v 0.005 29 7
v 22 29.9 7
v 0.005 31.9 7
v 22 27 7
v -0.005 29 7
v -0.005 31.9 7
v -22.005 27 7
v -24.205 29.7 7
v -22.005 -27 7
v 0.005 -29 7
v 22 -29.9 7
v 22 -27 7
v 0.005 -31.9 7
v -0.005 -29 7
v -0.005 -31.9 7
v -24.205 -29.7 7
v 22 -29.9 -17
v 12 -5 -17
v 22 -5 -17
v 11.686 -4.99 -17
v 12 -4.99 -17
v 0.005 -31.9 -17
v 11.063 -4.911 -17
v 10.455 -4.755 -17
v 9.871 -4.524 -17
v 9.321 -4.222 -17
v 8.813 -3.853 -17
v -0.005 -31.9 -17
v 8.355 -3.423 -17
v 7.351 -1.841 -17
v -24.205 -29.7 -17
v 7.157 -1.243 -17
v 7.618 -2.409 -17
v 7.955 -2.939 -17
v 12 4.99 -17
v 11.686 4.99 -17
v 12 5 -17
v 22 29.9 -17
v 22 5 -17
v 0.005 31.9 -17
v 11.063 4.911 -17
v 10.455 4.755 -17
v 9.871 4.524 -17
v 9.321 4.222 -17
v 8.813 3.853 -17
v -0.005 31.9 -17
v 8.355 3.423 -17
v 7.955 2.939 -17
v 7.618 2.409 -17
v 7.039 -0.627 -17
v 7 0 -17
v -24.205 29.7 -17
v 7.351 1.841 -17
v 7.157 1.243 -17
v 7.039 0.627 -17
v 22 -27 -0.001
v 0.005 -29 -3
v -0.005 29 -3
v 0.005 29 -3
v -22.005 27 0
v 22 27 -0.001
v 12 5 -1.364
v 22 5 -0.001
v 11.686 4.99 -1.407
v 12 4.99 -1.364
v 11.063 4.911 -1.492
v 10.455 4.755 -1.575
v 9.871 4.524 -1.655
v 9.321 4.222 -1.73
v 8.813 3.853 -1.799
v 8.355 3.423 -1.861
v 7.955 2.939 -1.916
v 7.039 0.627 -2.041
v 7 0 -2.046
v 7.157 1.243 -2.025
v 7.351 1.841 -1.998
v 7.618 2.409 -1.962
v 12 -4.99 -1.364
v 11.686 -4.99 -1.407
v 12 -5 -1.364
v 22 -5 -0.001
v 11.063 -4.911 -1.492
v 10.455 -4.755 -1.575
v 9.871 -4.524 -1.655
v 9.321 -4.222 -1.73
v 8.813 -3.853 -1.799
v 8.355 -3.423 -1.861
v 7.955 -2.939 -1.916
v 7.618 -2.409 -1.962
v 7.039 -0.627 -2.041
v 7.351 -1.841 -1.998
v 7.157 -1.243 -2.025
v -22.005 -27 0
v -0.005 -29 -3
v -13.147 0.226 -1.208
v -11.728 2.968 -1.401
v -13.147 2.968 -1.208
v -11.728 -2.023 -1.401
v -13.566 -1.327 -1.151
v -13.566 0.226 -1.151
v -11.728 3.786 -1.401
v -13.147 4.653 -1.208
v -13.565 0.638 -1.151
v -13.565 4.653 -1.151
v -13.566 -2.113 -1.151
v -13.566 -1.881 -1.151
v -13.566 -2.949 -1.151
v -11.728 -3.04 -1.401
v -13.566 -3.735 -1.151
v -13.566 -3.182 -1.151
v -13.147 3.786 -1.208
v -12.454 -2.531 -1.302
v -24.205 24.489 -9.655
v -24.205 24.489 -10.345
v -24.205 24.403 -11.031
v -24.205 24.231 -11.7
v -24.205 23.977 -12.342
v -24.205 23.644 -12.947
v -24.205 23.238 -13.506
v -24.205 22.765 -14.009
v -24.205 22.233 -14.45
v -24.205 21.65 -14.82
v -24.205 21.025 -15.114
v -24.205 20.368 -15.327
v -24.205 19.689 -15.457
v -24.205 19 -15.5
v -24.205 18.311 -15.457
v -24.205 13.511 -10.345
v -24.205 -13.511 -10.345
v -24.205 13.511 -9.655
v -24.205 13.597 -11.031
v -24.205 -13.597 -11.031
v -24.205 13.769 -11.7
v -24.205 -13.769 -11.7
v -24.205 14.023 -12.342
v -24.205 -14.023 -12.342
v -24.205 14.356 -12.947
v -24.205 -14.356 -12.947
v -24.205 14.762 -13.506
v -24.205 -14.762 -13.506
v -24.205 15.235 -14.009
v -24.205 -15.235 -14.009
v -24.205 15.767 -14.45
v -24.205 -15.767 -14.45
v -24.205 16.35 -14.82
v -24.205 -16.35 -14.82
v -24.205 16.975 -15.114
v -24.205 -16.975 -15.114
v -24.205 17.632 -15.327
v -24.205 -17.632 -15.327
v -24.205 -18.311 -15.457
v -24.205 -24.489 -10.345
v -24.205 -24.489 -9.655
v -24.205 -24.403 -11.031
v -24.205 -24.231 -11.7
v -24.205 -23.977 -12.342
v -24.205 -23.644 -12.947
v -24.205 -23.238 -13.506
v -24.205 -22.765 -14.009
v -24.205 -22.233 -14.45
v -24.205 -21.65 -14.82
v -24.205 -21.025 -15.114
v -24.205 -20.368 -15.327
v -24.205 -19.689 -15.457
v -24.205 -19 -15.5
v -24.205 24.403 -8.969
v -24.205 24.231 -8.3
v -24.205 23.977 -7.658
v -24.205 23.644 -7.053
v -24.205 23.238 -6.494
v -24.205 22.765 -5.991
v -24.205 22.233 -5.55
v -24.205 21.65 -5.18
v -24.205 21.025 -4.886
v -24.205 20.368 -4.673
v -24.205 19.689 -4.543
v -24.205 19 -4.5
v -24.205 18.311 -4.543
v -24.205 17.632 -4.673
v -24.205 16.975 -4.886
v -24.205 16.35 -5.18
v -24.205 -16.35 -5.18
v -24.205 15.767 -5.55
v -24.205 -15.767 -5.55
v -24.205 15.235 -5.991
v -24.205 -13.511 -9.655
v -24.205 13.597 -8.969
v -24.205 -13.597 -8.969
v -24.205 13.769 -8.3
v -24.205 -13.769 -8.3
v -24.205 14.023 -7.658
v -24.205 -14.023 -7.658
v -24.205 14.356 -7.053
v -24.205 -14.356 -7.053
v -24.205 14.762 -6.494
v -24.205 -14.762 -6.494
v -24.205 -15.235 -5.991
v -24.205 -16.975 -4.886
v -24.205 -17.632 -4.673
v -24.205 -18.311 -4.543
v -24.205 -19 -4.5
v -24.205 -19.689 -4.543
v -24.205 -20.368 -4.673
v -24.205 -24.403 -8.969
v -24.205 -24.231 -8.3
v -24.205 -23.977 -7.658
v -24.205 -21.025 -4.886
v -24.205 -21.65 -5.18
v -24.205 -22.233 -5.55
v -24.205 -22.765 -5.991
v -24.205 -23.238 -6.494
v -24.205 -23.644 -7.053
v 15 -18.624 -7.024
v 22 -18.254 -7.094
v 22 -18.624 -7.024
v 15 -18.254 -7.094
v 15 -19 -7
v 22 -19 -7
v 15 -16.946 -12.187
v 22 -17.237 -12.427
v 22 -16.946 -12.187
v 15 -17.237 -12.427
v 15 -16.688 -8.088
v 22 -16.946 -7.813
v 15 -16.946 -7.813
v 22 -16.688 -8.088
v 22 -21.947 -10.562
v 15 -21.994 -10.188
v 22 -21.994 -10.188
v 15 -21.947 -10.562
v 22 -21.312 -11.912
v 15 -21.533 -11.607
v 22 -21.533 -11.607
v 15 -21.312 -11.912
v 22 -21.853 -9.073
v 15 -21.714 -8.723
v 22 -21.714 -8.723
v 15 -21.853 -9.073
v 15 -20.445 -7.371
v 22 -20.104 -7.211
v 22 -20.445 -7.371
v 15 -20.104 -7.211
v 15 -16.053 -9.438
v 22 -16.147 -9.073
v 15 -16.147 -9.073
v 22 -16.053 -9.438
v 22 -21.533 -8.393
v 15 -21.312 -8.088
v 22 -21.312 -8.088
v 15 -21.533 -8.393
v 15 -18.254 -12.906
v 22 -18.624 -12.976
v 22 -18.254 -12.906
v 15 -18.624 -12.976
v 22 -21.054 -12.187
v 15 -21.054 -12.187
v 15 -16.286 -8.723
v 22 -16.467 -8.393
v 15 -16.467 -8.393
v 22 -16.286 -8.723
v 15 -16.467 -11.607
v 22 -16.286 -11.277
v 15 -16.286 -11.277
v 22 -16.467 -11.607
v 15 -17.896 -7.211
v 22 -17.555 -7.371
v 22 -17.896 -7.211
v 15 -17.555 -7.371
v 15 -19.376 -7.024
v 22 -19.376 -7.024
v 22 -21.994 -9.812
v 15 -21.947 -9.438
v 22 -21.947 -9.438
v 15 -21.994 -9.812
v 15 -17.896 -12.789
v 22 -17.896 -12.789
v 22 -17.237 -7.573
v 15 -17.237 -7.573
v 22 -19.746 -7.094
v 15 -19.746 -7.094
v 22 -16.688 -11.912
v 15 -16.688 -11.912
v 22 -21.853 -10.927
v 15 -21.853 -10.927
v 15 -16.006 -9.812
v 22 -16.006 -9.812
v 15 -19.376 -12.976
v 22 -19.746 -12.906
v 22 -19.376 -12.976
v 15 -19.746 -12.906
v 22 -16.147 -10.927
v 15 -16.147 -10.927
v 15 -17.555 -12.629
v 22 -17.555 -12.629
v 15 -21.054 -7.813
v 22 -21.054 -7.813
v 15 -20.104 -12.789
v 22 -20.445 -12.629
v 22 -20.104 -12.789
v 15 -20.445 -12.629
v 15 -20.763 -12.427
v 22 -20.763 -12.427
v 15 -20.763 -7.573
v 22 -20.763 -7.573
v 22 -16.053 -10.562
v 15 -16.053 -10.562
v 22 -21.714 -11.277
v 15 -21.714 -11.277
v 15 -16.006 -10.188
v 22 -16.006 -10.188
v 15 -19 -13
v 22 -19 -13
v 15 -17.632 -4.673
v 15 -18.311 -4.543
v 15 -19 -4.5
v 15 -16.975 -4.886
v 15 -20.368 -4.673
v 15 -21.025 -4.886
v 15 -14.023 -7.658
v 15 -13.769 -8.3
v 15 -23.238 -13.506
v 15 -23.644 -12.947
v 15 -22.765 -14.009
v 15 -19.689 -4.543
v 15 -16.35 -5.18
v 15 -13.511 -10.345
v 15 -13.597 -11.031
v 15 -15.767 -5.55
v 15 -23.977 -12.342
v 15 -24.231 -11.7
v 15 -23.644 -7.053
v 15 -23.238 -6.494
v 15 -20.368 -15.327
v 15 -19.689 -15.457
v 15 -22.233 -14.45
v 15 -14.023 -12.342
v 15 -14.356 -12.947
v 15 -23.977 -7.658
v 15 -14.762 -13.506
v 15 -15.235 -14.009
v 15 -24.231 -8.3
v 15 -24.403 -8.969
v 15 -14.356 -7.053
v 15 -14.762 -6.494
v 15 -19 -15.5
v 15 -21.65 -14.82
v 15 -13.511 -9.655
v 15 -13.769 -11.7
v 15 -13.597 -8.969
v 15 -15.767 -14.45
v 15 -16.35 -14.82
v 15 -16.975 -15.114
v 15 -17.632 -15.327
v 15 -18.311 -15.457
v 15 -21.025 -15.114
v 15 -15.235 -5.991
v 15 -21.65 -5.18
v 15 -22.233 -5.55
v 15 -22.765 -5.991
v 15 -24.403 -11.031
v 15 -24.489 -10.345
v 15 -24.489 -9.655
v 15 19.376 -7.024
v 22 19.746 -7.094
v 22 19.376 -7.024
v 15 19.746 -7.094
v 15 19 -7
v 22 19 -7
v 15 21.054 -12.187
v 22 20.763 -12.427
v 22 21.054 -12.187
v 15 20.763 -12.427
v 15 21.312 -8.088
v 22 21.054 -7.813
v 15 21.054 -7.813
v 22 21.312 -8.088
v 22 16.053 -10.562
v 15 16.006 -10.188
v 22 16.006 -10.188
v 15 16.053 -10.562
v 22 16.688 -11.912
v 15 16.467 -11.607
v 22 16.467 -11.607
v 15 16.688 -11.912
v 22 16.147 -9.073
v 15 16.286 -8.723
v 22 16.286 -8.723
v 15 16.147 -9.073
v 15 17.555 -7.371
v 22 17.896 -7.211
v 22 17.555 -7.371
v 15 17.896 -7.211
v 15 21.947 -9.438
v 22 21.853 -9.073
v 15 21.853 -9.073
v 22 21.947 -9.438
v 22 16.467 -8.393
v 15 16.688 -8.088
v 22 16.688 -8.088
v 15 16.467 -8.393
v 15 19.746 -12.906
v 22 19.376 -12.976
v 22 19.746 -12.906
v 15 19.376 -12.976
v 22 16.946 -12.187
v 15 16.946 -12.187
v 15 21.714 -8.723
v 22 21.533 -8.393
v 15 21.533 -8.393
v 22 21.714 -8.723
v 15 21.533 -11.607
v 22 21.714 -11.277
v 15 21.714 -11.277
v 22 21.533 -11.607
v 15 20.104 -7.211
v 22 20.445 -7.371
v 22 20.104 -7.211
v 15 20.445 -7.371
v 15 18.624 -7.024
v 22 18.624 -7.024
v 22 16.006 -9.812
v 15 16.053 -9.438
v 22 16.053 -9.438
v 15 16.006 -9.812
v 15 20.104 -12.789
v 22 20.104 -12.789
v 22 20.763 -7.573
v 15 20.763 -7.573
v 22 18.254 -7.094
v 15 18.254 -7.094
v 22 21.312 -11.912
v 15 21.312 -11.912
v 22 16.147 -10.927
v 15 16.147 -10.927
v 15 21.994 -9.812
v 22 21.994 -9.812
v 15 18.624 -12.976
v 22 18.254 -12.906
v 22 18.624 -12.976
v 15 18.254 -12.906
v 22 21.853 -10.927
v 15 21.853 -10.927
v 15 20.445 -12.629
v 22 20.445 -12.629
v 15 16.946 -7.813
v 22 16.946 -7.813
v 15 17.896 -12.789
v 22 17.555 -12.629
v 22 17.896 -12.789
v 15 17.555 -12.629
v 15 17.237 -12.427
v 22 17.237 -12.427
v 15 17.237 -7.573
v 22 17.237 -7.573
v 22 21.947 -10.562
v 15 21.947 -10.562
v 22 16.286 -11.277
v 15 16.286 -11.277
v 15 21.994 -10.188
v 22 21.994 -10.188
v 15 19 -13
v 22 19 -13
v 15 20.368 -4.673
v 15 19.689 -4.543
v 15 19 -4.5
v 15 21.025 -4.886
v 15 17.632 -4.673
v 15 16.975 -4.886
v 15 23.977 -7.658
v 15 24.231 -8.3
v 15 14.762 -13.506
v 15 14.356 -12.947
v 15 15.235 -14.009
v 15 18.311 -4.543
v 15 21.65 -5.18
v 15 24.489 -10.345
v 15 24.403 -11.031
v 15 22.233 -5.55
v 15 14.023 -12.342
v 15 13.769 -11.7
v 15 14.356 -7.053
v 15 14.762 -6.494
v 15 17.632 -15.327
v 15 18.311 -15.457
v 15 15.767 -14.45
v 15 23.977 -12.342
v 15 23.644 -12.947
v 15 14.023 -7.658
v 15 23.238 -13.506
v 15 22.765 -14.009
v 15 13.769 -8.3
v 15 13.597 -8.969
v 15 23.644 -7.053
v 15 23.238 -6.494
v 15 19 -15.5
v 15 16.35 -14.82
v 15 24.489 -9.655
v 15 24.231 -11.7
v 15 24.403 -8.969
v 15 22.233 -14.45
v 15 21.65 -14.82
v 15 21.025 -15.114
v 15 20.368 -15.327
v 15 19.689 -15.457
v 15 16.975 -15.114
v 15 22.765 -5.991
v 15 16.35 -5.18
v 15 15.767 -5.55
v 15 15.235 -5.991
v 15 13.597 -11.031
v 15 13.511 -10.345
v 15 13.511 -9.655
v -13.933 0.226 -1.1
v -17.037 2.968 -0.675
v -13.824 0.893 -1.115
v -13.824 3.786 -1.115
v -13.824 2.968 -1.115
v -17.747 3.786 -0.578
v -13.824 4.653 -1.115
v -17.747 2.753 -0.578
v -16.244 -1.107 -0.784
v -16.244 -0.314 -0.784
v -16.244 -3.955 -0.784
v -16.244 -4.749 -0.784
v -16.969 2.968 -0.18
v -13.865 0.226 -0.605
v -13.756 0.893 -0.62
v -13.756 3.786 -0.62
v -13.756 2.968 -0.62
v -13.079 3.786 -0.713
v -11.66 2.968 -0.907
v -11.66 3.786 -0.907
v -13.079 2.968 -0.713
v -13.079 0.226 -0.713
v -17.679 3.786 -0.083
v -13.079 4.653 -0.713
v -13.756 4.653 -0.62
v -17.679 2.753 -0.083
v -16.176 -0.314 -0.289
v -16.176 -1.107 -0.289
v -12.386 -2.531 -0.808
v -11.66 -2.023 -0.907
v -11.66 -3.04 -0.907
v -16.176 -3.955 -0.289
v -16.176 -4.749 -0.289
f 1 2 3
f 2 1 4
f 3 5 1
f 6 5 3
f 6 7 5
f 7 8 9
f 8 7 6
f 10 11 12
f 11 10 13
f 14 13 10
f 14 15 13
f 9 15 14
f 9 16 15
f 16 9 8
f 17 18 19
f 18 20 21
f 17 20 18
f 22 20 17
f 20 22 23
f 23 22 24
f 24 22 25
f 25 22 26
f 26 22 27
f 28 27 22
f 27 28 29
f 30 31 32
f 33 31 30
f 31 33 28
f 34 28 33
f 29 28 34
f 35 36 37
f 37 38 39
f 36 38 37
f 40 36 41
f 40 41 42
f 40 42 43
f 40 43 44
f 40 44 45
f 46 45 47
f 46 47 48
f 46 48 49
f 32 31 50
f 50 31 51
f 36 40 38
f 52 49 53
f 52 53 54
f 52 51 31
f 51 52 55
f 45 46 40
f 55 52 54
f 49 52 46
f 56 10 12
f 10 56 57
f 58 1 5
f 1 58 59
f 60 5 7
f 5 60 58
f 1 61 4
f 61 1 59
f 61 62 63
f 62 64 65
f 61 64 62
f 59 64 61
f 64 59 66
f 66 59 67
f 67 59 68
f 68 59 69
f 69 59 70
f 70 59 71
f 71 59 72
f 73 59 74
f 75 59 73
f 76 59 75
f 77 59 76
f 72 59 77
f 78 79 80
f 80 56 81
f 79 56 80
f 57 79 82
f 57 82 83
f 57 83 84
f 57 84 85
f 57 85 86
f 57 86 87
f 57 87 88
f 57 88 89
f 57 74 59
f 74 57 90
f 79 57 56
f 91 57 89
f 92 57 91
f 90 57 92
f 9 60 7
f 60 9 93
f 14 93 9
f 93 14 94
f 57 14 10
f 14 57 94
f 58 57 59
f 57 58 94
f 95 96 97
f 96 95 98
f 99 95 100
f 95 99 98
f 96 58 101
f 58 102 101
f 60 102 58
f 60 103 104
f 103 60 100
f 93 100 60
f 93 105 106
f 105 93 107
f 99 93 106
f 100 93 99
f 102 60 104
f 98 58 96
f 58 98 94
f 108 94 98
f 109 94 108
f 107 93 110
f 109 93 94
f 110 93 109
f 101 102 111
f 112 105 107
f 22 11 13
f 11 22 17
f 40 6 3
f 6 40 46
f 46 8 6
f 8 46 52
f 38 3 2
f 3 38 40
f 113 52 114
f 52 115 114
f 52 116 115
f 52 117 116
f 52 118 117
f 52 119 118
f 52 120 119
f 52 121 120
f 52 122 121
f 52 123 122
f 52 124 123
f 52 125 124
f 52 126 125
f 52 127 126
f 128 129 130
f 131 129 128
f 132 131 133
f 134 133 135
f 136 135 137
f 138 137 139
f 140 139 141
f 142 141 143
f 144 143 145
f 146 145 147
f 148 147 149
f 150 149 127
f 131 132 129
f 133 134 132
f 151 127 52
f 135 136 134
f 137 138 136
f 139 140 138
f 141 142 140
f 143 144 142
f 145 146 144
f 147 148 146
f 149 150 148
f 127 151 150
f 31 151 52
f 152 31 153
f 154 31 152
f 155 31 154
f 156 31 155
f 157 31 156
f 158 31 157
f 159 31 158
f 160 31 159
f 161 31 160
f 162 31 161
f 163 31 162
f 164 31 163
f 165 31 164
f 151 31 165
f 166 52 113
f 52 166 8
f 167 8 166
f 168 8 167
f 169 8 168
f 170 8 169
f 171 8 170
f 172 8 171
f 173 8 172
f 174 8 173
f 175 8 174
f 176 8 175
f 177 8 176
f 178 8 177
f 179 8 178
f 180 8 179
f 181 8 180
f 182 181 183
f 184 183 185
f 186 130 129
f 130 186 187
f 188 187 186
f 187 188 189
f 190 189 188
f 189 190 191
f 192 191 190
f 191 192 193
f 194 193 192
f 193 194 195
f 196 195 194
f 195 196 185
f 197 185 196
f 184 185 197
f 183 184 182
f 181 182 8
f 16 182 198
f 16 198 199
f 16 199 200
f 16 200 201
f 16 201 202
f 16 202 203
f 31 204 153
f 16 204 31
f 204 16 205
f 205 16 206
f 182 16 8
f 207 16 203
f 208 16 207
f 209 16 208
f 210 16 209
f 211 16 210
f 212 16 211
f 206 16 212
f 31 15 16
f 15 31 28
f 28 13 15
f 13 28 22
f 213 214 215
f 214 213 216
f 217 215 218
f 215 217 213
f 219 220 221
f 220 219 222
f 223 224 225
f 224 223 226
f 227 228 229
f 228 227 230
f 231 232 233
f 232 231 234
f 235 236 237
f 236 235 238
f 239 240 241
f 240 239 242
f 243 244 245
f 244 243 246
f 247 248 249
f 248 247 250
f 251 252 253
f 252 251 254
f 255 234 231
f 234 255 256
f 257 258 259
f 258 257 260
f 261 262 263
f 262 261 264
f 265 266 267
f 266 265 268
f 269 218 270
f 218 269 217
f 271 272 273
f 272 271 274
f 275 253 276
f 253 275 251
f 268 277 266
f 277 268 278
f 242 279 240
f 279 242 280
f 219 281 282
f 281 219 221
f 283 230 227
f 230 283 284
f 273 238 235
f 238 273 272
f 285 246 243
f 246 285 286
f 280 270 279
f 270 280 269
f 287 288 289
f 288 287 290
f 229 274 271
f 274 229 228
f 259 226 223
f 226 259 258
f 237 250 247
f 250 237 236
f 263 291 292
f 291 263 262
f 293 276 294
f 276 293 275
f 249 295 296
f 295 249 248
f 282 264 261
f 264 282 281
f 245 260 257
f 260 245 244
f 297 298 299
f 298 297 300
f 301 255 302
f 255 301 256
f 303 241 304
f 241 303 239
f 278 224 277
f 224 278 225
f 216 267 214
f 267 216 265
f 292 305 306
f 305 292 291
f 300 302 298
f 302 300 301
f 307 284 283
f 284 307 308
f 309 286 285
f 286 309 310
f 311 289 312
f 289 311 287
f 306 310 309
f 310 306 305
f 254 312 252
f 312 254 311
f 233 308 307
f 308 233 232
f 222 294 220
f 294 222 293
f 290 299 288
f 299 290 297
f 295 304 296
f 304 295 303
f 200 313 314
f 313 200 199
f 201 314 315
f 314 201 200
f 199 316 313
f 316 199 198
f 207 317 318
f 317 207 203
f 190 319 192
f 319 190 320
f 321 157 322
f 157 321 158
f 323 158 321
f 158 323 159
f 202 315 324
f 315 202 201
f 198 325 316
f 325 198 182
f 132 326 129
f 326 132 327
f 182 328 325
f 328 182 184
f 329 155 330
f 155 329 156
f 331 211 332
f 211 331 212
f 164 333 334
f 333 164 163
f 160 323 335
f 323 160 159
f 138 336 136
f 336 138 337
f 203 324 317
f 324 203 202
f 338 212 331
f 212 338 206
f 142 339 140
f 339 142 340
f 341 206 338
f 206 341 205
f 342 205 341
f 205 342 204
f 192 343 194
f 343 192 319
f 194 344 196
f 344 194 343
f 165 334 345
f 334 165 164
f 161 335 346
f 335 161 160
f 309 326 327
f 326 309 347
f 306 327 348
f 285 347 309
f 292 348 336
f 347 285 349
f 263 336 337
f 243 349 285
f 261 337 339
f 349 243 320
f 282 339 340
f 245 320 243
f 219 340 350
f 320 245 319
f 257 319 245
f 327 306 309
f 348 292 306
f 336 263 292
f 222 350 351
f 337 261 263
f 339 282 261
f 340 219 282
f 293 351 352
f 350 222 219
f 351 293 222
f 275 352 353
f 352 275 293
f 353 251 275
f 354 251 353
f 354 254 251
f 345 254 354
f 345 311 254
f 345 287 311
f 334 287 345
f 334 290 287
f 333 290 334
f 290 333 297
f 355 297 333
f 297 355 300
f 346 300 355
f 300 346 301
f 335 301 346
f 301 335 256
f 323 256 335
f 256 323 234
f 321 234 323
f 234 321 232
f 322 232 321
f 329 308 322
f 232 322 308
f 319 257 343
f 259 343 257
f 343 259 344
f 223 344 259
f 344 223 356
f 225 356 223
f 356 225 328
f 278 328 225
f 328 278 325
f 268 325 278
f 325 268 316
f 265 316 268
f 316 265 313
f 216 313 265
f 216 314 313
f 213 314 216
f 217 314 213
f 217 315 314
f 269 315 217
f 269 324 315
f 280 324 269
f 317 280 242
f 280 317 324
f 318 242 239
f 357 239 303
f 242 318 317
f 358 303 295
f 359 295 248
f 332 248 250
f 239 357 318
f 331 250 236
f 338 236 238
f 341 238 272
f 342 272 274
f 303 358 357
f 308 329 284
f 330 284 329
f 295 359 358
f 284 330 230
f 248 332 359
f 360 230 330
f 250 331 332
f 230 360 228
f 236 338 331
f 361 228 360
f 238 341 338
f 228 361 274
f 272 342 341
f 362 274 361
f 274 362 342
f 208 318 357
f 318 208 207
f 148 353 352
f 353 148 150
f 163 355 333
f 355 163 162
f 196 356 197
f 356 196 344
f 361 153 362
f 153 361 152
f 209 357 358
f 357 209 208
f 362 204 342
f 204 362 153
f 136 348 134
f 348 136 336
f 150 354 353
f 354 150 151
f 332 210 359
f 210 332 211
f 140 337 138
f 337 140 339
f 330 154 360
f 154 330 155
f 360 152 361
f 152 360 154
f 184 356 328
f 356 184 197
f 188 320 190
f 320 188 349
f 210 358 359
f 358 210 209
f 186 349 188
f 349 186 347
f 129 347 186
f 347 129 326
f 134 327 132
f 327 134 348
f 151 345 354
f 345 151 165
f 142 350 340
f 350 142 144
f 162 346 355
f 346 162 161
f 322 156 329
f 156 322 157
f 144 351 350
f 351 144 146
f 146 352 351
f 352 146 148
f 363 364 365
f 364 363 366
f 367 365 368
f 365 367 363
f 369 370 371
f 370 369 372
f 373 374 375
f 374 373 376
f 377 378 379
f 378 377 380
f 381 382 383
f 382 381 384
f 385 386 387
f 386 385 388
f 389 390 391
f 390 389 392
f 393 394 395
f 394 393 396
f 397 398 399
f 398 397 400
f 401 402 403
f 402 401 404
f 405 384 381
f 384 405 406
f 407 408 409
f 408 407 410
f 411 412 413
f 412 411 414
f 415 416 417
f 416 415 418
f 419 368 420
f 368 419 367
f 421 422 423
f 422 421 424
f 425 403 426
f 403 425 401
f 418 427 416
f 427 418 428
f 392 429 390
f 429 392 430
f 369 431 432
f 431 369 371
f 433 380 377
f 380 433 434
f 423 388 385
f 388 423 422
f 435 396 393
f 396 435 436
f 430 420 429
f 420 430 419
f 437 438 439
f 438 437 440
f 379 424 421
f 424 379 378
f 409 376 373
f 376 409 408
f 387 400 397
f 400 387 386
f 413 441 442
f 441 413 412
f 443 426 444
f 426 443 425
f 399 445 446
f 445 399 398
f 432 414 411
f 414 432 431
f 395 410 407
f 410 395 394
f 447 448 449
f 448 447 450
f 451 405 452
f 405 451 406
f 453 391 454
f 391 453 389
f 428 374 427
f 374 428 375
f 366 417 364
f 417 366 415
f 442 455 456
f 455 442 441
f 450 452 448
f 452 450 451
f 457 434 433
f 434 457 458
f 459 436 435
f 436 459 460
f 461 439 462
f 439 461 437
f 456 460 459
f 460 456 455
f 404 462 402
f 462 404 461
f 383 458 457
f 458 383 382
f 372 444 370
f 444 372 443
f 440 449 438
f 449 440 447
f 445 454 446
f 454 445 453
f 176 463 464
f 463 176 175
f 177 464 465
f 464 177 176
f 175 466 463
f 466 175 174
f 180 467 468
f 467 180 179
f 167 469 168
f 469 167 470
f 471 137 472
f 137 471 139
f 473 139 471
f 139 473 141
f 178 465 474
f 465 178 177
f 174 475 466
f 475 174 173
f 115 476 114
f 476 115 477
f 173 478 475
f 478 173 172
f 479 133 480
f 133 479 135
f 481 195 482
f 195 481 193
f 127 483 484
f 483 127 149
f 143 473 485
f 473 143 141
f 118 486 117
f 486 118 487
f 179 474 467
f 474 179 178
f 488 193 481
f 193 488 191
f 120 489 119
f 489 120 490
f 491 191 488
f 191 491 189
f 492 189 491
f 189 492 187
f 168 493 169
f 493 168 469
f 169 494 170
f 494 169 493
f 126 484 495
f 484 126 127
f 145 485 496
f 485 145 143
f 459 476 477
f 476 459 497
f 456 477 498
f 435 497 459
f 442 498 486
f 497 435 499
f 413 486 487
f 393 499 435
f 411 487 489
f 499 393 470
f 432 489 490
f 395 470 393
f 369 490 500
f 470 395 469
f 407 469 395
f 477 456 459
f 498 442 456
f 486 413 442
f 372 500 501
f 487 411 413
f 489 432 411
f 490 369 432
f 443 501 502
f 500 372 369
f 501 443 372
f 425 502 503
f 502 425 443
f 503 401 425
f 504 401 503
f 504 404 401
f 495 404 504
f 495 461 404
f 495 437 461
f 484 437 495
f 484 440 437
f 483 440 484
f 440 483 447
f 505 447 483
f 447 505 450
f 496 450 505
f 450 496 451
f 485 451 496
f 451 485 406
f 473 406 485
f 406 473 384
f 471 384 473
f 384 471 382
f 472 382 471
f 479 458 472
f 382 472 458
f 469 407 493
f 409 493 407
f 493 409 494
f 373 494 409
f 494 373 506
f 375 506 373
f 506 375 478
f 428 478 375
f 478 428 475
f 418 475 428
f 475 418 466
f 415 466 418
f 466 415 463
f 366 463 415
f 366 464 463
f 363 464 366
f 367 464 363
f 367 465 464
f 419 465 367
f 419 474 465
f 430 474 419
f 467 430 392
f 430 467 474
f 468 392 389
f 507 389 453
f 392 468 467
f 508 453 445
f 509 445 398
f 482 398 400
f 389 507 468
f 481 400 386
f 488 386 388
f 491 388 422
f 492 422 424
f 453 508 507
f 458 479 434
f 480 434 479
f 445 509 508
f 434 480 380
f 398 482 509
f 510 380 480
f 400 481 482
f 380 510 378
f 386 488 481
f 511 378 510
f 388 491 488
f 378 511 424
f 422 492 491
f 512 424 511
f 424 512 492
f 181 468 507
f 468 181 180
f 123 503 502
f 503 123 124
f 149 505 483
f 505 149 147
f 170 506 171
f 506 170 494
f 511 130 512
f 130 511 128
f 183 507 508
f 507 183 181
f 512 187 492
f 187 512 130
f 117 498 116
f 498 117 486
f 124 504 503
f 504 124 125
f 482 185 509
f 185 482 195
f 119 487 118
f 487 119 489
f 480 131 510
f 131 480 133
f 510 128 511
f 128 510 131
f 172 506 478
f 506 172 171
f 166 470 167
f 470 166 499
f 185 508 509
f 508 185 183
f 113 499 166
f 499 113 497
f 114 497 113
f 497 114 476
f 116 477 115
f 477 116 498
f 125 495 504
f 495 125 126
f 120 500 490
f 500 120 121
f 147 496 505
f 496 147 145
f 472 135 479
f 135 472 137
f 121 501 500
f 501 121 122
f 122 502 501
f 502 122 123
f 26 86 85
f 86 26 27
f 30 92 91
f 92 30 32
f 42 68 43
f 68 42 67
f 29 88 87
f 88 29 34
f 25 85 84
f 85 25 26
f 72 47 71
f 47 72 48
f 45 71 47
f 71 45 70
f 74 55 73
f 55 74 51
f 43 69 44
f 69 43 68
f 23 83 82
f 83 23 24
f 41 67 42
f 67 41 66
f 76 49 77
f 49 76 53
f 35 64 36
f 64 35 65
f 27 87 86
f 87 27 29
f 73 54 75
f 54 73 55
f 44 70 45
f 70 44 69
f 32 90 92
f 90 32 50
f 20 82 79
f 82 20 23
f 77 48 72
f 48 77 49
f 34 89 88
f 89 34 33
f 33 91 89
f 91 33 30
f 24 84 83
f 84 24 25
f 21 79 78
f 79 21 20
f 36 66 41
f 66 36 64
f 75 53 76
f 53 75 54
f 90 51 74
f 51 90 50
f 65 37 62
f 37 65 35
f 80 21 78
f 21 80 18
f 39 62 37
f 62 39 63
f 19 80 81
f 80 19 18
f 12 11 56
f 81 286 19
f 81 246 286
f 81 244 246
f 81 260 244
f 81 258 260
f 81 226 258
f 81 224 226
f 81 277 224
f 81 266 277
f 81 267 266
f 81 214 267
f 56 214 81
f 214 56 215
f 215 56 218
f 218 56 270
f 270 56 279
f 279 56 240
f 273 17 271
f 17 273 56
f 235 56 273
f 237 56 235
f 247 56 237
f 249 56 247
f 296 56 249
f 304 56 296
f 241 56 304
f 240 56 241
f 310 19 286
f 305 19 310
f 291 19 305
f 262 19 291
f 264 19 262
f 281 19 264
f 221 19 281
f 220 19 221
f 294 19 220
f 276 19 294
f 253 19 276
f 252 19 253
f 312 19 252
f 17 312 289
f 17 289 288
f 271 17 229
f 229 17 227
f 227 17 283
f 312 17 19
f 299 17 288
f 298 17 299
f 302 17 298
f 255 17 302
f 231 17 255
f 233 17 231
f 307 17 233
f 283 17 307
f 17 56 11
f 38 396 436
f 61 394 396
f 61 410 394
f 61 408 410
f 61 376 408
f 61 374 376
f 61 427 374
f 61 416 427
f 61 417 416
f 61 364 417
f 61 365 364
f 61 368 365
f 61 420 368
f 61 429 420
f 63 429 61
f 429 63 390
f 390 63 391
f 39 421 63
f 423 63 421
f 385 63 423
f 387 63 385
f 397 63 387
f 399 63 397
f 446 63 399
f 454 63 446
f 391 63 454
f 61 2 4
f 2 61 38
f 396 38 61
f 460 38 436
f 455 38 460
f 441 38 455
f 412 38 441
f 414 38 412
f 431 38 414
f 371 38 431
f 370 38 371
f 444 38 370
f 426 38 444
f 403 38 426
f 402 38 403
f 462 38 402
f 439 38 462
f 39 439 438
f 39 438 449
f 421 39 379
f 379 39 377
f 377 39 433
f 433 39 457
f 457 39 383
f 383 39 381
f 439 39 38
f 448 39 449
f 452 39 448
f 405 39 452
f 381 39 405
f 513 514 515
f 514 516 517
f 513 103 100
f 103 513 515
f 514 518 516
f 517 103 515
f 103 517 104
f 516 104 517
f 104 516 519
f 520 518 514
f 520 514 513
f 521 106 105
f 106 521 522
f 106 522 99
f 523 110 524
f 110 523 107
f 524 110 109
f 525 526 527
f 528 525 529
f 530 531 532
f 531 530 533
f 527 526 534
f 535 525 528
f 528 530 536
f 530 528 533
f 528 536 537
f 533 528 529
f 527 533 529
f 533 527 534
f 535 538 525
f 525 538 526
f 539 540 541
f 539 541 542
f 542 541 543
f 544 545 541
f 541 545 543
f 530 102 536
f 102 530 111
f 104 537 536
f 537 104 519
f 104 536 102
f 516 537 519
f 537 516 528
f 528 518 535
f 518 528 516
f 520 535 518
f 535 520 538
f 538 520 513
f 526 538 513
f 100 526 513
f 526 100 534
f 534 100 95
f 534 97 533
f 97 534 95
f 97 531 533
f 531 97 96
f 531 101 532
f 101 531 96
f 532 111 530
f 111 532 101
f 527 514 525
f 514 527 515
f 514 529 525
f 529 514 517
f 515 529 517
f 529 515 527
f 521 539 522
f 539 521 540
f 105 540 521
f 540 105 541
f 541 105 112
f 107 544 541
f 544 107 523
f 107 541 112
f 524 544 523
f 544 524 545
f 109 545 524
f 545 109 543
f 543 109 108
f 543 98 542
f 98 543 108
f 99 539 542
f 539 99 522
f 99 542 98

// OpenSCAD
// file: doublefrustum.scad
//	  Last Modification : 01:57 Feb 20 2022 kivinen
//	  Last check in     : $Date: $
//	  Revision number   : $Revision: $
//	  State             : $State: $
//	  Version	    : 1.2
//	  Edit time	    : 5 min

// Make double frustum, i.e, three squares at z locations z0, z1, z2
// so that first square is +-x0, +-y0 etc.
module doublefrustum(z0, z1, z2, x0, y0, x1, y1, x2, y2) {
  POINTS=[[-x0, -y0, z0],
	  [x0, -y0, z0],
	  [x0, y0, z0],
	  [-x0, y0, z0],
	  [-x1, -y1, z1],
	  [x1, -y1, z1],
	  [x1, y1, z1],
	  [-x1, y1, z1],	  
	  [-x2, -y2, z2],
	  [x2, -y2, z2],
	  [x2, y2, z2],
	  [-x2, y2, z2]];
  FACES = [ [ 0, 1, 2, 3 ], // Bottom
	    [ 0, 4, 5, 1 ], // Bottom front
	    [ 1, 5, 6, 2 ], // Bottom right
	    [ 0, 3, 7, 4 ], // Bottom left
	    [ 3, 2, 6, 7 ], // Bottom back
	    [ 4, 8, 9, 5 ], // Top front
	    [ 5, 9, 10, 6 ], // Top right
	    [ 4, 7, 11, 8 ], // Top left
	    [ 6, 10, 11, 7 ], // Top back
	    [ 8, 11, 10, 9 ] ];
  polyhedron(points = POINTS, faces = FACES, convexity = 2);
}
// file: powerstrip.scad
//	  Last Modification : 07:18 Feb 20 2022 kivinen
//	  Last check in     : $Date: $
//	  Revision number   : $Revision: $
//	  State             : $State: $
//	  Version	    : 1.85
//	  Edit time	    : 44 min


use <doublefrustum.scad>

POWER_HEIGHT=44;
POWER_LEN=360;
POWER_WIDTH=54;
POWER_WIDTH_BULGE=2;
POWER_LEN_BULGE=3;

POWER_PLUG_DIA=39;
POWER_PLUG_DEPTH=18;
POWER_PLUG_GAP=13.5;
POWER_PLUG_FIRST_GAP=7;

POWER_ROUNDING_R=2;

$fn=50;

module powerstrip(sockets, cable) {
  difference() {
    translate([0, 0, -POWER_HEIGHT/2])
      doublefrustum(0, POWER_HEIGHT/2, POWER_HEIGHT, // z0, z1, z2
		  POWER_LEN/2, POWER_WIDTH/2, // x0, y0
		    POWER_LEN/2 + POWER_LEN_BULGE,  // x1
		    POWER_WIDTH/2 + POWER_WIDTH_BULGE, //y1
		    POWER_LEN/2, POWER_WIDTH/2); // x2, y2
    if (sockets) { 
      for(i=[0:1:5]) {
	translate([POWER_LEN/2 - POWER_PLUG_FIRST_GAP - POWER_PLUG_DIA/2 -
		   i * (POWER_PLUG_DIA + POWER_PLUG_GAP), 0, 0])
	  translate([0, 0, POWER_HEIGHT/2 - POWER_PLUG_DEPTH/2+1])
	  cylinder(h=POWER_PLUG_DEPTH+1, d=POWER_PLUG_DIA, center=true);
      }
    }
  }
  if (cable) {
    translate([-POWER_LEN/2 - 20/2, 0, -11])
      rotate([0, 90, 0])
      cylinder(h=20, d=8, center=true);
  }
}

module powerstrip_solid(sockets, cable) {
  difference() {
    translate([0, 0, -POWER_HEIGHT/2])
      hull() {
      translate([0, 0, 0])
	cube([POWER_LEN, POWER_WIDTH, 0.01], center=true);
      translate([0, 0, POWER_HEIGHT/2])
	cube([POWER_LEN + POWER_LEN_BULGE * 2,
	      POWER_WIDTH + POWER_WIDTH_BULGE * 2, 0.01], center=true);
      translate([0, 0, POWER_HEIGHT])
	cube([POWER_LEN, POWER_WIDTH, 0.01], center=true);
    }
    if (sockets) {
      for(i=[0:1:5]) {
	translate([POWER_LEN/2 - POWER_PLUG_FIRST_GAP - POWER_PLUG_DIA/2 -
		   i * (POWER_PLUG_DIA + POWER_PLUG_GAP), 0, 0])
	  translate([0, 0, POWER_HEIGHT/2 - POWER_PLUG_DEPTH/2+1])
	  cylinder(h=POWER_PLUG_DEPTH+1, d=POWER_PLUG_DIA, center=true);
      }
    }
  }
  if (cable) {
    translate([-POWER_LEN/2 - 20/2, 0, -11])
      rotate([0, 90, 0])
      cylinder(h=20, d=8, center=true);
  }
}

module rcube(size, r) {
  hull() {
    translate([size[0]/2-r, size[1]/2-r, 0])
      sphere(r=r);
    translate([-(size[0]/2-r), size[1]/2-r, 0])
      sphere(r=r);
    translate([size[0]/2-r, -(size[1]/2-r), 0])
      sphere(r=r);
    translate([-(size[0]/2-r), -(size[1]/2-r), 0])
      sphere(r=r);
  }
}

module powerstrip_solid_rounded(sockets, cable) {
  difference() {
    translate([0, 0, -POWER_HEIGHT/2])
      hull() {
      translate([0, 0, POWER_ROUNDING_R])
	rcube([POWER_LEN, POWER_WIDTH], POWER_ROUNDING_R);
      translate([0, 0, POWER_HEIGHT/2])
	rcube([POWER_LEN + POWER_LEN_BULGE * 2,
	       POWER_WIDTH + POWER_WIDTH_BULGE * 2],
	      POWER_ROUNDING_R);
      translate([0, 0, POWER_HEIGHT-POWER_ROUNDING_R])
	rcube([POWER_LEN, POWER_WIDTH], POWER_ROUNDING_R);
    }
    if (sockets) {
      for(i=[0:1:5]) {
	translate([POWER_LEN/2 - POWER_PLUG_FIRST_GAP - POWER_PLUG_DIA/2 -
		   i * (POWER_PLUG_DIA + POWER_PLUG_GAP), 0, 0])
	  translate([0, 0, POWER_HEIGHT/2 - POWER_PLUG_DEPTH/2+1])
	  cylinder(h=POWER_PLUG_DEPTH+1, d=POWER_PLUG_DIA, center=true);
      }
    }
  }
  if (cable) {
    translate([-POWER_LEN/2 - 20/2, 0, -11])
      rotate([0, 90, 0])
      cylinder(h=20, d=8, center=true);
  }
}

powerstrip_solid_rounded(true, true);
// main file
//	  Last Modification : 10:45 Feb 20 2022 kivinen
//	  Last check in     : $Date: $
//	  Revision number   : $Revision: $
//	  State             : $State: $
//	  Version	    : 1.318
//	  Edit time	    : 86 min

use <powerstrip.scad>;
  
ALPHA=0.8;

WIDTH_TOP=54;
WIDTH_MAX=58;
WIDTH_BOTTOM=54;

LEN=360;

HEIGHT=44;
HEIGHT_TO_MAX=22;

CABLE_HOLE_DIA=10;
CABLE_HOLE_Z=10;

BULGE=3;

SCREW_DIA=6;
HEAD_DIA=11;

CAP_THICKNESS=24;

// Verson
VERSION="v4";

// Fonts
FONT="Liberation Sans Bold";
FONT_SIZE=6;

$fn=50;


module powerbar() {
  powerstrip_solid();
}

module end_cap() {
  difference() {
    intersection() {
      // Outer intersection with 1.1 scale, do not translate, as we want
      // flat bottom
      scale([1.1, 1.1, 1.1])
	translate([0, 0, 0])
	powerbar();
      difference() {
	translate([-5, 0, 0])
	  // End piece cube
	  cube([CAP_THICKNESS, WIDTH_MAX * 2, HEIGHT * 2], center=true);
	// Remove powerstrip from it
	translate([LEN/2, 0, 0])
	  powerbar();
      }
    }
    // Make hole for cable
    translate([0, 0, -HEIGHT/2+CABLE_HOLE_Z])
      rotate([0, 90, 0])
      cylinder(h=CAP_THICKNESS * 2, d=CABLE_HOLE_DIA, center=true);
    // Widen it to the bottom of holder
    translate([0, 0, -HEIGHT/2 + CABLE_HOLE_Z/2-1])
      cube([CAP_THICKNESS * 2, CABLE_HOLE_DIA, CABLE_HOLE_Z+2], center=true);
    // Remove bottom section
    translate([0, 0, -HEIGHT/2 - 20/2])
      cube([CAP_THICKNESS * 2, WIDTH_MAX * 2, 20], center=true);

    // Make holes for the screws
    translate([-10, -WIDTH_MAX/2+10, 0])
      union() {
      cylinder(h=HEIGHT*2, d=SCREW_DIA, center=true);
      translate([0, 0, HEIGHT/2-15])
	cylinder(h=HEIGHT, d=HEAD_DIA, center=true);
    }
    translate([-10, WIDTH_MAX/2-10, 0])
      union() {
      cylinder(h=HEIGHT*2, d=SCREW_DIA, center=true);
      translate([0, 0, HEIGHT/2-15])
	cylinder(h=HEIGHT, d=HEAD_DIA, center=true);
    }
  }
  // Version text
  //      translate([BACKPLATE_THICKNESS + 10, +30, THICKNESS_UPPER])
  translate([-1.5+0.5, 0, HEIGHT/3])
    rotate([0, 7.8, 0])
    rotate([90, 0, 0])
    rotate([0, 90, 0])
    linear_extrude(0.5)
    text(text=VERSION, font = FONT, size = FONT_SIZE,
	 valign = "center", halign = "center");
}

rotate([0,-90,0]) end_cap();
